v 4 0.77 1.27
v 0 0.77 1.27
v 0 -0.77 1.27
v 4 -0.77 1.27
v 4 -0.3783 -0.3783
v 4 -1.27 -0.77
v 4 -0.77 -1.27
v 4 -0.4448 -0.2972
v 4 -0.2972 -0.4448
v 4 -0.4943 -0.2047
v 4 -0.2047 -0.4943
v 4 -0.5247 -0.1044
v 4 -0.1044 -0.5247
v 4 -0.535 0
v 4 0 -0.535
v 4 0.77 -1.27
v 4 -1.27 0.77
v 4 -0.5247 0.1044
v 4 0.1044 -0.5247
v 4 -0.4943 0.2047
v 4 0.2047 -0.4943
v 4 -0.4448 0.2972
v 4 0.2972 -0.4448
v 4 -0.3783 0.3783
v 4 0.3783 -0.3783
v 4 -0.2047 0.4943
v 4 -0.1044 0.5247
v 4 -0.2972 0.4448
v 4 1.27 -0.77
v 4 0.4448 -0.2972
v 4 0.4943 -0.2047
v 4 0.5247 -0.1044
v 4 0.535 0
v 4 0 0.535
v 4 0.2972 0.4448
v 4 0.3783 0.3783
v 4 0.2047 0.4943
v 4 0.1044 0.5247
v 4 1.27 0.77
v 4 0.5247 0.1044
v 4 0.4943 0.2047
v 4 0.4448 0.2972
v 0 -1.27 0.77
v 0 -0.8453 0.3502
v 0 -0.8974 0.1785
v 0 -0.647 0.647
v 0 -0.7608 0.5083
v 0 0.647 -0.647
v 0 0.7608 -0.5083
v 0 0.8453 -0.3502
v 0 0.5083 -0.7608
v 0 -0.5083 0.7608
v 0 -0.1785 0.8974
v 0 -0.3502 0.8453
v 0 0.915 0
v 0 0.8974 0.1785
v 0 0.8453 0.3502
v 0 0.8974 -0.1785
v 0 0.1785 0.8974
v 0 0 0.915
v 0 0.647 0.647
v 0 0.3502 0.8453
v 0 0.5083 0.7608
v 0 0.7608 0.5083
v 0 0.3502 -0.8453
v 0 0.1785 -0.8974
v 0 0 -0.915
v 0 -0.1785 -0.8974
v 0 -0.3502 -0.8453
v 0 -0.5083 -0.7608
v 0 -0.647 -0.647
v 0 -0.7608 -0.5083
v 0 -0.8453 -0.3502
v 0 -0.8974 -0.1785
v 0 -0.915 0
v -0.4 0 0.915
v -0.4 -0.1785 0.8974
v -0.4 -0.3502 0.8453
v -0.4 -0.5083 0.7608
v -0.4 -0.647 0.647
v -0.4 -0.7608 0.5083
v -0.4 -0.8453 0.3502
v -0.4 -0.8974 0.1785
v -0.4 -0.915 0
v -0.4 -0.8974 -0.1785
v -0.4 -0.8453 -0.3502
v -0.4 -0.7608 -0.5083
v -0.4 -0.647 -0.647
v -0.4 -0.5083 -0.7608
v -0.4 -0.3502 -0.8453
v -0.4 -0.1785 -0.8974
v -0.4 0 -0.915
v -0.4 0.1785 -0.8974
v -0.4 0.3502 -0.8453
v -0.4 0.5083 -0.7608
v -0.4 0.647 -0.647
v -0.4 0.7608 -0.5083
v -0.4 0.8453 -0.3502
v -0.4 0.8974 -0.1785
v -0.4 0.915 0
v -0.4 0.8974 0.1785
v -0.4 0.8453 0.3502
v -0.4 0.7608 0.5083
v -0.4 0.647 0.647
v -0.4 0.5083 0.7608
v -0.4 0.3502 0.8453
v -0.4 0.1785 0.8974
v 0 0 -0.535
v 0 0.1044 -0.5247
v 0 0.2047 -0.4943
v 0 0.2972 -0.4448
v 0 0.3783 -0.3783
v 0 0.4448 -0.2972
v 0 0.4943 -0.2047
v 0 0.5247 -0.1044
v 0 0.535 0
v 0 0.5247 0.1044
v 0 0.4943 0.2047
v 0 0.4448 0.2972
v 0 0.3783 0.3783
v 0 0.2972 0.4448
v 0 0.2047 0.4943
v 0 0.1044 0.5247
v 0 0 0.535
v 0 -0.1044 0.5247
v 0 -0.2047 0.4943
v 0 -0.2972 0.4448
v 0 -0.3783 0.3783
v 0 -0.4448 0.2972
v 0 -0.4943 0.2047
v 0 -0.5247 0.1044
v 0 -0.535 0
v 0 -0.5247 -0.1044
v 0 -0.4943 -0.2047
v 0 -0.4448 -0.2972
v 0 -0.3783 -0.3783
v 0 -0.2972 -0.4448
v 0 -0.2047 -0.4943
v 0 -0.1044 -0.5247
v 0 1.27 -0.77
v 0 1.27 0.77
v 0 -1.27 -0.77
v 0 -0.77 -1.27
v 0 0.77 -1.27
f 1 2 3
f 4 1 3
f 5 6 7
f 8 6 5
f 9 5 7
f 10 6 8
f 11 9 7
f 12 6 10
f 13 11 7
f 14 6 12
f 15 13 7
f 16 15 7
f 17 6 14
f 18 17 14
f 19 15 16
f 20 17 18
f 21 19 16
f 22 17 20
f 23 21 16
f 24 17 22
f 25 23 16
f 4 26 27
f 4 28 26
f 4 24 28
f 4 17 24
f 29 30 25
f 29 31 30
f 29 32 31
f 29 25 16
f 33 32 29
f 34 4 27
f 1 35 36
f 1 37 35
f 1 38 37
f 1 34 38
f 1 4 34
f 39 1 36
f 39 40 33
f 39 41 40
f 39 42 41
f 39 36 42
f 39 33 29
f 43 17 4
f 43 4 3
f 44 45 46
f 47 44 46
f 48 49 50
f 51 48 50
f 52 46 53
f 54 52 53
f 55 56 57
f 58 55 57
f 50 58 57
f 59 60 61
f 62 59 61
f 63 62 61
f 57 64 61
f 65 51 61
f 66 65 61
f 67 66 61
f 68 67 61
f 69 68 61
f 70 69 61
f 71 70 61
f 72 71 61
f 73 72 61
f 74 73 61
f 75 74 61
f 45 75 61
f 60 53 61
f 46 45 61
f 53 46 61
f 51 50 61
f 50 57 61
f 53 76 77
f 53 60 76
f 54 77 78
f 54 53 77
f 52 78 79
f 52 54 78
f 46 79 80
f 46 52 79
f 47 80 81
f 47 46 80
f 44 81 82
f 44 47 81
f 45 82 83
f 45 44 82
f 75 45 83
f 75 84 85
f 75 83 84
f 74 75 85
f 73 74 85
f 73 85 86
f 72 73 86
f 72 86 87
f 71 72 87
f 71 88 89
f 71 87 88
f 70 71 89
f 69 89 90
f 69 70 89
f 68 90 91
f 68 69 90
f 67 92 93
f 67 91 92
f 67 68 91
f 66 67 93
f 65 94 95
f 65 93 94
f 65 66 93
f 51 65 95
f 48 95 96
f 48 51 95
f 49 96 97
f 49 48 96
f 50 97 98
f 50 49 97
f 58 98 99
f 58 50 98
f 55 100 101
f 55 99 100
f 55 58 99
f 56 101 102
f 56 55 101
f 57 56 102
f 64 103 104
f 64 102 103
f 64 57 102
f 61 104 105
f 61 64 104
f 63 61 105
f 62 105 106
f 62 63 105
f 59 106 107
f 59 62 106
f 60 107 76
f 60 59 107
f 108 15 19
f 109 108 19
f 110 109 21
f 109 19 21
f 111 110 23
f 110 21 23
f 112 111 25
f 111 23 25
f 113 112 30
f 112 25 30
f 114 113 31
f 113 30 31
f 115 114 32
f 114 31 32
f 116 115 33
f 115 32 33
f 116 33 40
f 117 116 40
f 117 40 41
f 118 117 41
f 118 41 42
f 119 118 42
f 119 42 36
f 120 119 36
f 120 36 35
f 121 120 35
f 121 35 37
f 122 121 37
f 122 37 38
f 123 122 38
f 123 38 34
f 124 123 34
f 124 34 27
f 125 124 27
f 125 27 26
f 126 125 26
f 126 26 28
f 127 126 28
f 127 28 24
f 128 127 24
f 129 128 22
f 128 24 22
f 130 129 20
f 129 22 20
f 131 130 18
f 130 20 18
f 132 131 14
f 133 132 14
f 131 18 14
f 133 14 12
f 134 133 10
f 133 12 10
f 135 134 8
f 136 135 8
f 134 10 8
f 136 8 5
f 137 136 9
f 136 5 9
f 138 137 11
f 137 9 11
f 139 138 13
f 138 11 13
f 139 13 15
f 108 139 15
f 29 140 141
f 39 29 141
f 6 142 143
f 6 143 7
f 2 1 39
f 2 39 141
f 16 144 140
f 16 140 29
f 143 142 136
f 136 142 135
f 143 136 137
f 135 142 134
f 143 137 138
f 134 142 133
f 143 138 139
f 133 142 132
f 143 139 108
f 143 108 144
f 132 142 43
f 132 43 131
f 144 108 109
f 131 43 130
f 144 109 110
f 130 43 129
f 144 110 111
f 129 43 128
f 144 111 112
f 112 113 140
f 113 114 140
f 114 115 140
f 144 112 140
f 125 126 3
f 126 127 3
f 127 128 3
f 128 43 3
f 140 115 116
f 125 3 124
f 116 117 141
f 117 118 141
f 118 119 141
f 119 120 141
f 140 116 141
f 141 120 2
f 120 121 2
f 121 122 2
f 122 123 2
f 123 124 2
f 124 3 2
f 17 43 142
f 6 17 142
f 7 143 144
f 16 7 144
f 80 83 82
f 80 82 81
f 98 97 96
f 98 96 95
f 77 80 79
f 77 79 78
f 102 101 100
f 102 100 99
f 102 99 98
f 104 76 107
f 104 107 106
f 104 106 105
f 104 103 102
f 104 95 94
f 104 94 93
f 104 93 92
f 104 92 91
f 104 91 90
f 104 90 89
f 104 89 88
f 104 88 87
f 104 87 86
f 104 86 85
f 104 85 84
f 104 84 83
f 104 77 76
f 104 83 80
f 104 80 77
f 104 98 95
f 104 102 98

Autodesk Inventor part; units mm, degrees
ref_plane "YZ Plane" through (0, 0, 0) normal (1, 0, 0) x (0, 1, 0)
ref_plane "XZ Plane" through (0, 0, 0) normal (0, 1, 0) x (-1, 0, 0)
ref_plane "XY Plane" through (0, 0, 0) normal (0, 0, 1) x (1, 0, 0)
sketch "Sketch1" plane through (0, 0, 0) normal (1, 0, 0) x (0, 1, 0)
  line L0 (1.27, 1.27) -> (-1.27, 1.27)
  line L1 (-1.27, 1.27) -> (-1.27, -1.27)
  line L2 (-1.27, -1.27) -> (1.27, -1.27)
  line L3 (1.27, -1.27) -> (1.27, 1.27)
  point P0 (0, 0)
  point P1 (0, 1.27)
  point P2 (1.27, 0)
  dimension "d0" = 2.54
  dimension "d1" = 2.54
extrude "Extrusion1" add sketch "Sketch1" along normal blind 4
sketch "Sketch2" plane through (0, 0, 0) normal (-1, 0, 0) x (0, 0, 1)
  circle A0 centre (0, 0) radius 0.915
  dimension "d4" = 1.83
extrude "Extrusion2" add sketch "Sketch2" along normal blind 0.4 separate body
sketch "Sketch3" plane through (4, 0, 0) normal (1, 0, 0) x (0, 0, -1)
  circle A0 centre (0, 0) radius 0.535
  dimension "d7" = 1.07
extrude "Extrusion3" cut sketch "Sketch3" against normal blind 4 bodies 1
chamfer "Chamfer1" distance 0.5 angle 45 4 edges at (2, 1.27, -1.27) (2, -1.27, 1.27) (2, 1.27, 1.27) (2, -1.27, -1.27)
properties material "ABS Plastic"
